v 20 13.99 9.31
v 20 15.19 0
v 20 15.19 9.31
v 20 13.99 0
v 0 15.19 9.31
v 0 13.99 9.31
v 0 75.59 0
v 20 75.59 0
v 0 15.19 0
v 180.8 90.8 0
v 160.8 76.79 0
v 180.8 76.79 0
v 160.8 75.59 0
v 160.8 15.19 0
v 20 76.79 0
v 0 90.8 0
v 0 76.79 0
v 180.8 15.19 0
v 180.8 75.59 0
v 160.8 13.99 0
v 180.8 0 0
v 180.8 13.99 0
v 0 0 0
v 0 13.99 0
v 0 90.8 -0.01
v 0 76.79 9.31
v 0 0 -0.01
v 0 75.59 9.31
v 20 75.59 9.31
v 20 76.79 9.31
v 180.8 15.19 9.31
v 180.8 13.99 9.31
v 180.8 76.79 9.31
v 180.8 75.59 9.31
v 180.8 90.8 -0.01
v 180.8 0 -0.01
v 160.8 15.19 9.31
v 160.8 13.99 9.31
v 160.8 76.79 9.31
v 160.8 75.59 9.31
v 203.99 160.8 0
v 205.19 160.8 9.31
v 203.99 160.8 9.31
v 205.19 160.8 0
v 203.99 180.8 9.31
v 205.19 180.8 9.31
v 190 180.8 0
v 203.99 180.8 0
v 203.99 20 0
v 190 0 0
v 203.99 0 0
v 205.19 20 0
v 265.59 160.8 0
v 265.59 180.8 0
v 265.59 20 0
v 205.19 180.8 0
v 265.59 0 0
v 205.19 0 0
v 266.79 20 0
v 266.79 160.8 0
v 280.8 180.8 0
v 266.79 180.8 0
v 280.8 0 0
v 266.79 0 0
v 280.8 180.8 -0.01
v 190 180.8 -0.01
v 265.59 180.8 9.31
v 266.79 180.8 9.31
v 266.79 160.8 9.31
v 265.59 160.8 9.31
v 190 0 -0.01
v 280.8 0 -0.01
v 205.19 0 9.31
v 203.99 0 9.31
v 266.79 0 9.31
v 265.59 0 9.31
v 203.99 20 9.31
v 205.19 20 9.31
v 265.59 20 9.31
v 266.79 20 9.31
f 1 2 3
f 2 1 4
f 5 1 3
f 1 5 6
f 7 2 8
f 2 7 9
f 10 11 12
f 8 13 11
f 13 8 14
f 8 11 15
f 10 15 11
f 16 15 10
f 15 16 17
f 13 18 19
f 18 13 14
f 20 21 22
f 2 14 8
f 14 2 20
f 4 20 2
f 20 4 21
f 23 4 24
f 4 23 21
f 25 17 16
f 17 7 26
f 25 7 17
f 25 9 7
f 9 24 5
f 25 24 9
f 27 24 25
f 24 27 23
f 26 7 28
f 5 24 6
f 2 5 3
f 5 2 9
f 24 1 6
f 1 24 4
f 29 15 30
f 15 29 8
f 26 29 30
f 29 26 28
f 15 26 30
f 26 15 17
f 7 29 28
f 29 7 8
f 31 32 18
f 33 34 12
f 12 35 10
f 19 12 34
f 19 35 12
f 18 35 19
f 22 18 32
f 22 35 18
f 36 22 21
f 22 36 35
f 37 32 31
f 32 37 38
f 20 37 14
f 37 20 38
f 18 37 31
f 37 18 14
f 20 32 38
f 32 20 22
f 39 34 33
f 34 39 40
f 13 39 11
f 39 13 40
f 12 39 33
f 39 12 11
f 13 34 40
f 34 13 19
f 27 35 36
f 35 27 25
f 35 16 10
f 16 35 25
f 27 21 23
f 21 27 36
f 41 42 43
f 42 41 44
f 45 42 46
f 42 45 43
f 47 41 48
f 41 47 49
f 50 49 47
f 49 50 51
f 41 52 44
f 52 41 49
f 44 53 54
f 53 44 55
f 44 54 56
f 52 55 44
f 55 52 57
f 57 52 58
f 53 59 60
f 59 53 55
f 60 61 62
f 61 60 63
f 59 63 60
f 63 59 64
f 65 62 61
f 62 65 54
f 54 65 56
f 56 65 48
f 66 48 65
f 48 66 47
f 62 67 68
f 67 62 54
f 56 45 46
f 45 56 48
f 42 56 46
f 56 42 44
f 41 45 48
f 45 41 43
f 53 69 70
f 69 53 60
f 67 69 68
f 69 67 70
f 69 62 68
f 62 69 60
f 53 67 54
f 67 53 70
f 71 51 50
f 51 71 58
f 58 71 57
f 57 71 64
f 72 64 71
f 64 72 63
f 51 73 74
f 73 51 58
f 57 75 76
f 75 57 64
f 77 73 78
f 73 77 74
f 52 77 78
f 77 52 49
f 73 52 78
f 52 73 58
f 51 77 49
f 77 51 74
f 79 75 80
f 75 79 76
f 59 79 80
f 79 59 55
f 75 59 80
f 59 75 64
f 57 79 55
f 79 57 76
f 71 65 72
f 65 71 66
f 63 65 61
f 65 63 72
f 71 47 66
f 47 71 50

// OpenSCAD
// file: ../../Base/Boxes.scad
// Fischertechnik Box Foundation
// Pre-designed Boxes

use <Constants.scad>

include <PlacementOptions.scad>

box190Width = 190;
box190Depth = 130;
box130Width = 130;
box130Depth = 95;
boxUsageHeight = 33.9;
boxWallThickness = 2.4;
boxBaseThickness = 1.0;

// getBoxWallThickness()
// Gets the wall thickness of a Fischertechnik Box

function getBoxWallThickness() = boxWallThickness;

// Gets the usable height of a fischertechnik box
function getBoxUsageHeight() = boxUsageHeight;

// Gets the thickness of the Fischertechnik box base.
function getBoxBaseThickness() = boxBaseThickness;

// Gets the usable inner space of a Box 190 as an x/y-list
function getBox190Space() = [
    box190Width - 2*getBoxWallThickness(), 
    box190Depth - 2*getBoxWallThickness() ];

// Imports the Fischertechnik empty box 130x190 mm and places it at position 0,0
// 190x130 are the outer sizes, the inner space is slightly smaller. Use getBox190Space() to get the inner sizes.
// This module needs the STL file "Fischertechnik Box 130x190.stl" in the library path.
// The box is positioned that the usable inner space is at the 0,0,0 position. The

module Box190() {
    translate([-getBoxWallThickness(),-getBoxWallThickness(),-getBoxBaseThickness()])
        import("Fischertechnik Box 130x190.stl", convexity=3);
}

// Gets the usable inner space of a Box 130 as an x/y-list
function getBox130Space() = [
    box130Width - 2*getBoxWallThickness(), 
    box130Depth - 2*getBoxWallThickness() ];

// Imports the Fischertechnik empty box 95x130 mm and places it at position 0,0
// 190x130 are the outer sizes, the inner space is slightly smaller. Use getBox190Space() to get the inner sizes.
// This module needs the STL file "Fischertechnik Box 95x130.stl" in the library path.
// The box is positioned that the usable inner space is at the 0,0,0 position. The

module Box130() {
    translate([-getBoxWallThickness(),-getBoxWallThickness(),-getBoxBaseThickness()])
        import("Fischertechnik Box 95x130.stl", convexity=3);
}

// Creates a web at the specified box walls
// corner 0 = LowerLeft, 1 = UpperLeft, 2 = UpperRight, 3 = LowerRight
// side 0 = LeftOfCorner, 1 = RightOfCorner
// distance = Distance in mm from the corner
// box = inner width and depth of the box (default: Box 190)
// webWidth = length of the web (default is 3 mms)
// webThickness = thickness of the web (default is 1 mm)

module BoxWeb(corner, side, distance, box=getBox190Space(), webWidth=3, webThickness=1.0) {
    sink = getBoxWallThickness()/2;

    width = (corner % 2 == 0) ? 
            (side == LeftOfCorner ? webWidth : webThickness) :
            (side == LeftOfCorner ? webThickness : webWidth);

    depth = (corner % 2 == 0) ? 
            (side == RightOfCorner ? webWidth : webThickness) :
            (side == RightOfCorner ? webThickness : webWidth);
    
    xDiff = corner == LowerLeft ? 
                (side == LeftOfCorner ? -sink : distance) :
            (corner == UpperLeft ?                
                (side == LeftOfCorner ? distance : -sink) :
            (corner == UpperRight ?
                (side == LeftOfCorner ? box.x-webWidth+sink : box.x-distance-webThickness) :
                (side == LeftOfCorner ? box.x-distance-webThickness: box.x-webWidth+sink)));

    yDiff = corner == LowerLeft ? 
                (side == RightOfCorner ? -sink : distance) :
            (corner == UpperLeft ?
                (side == RightOfCorner ? box.y-distance : box.y-webWidth+sink) :
            (corner == UpperRight ?
                (side == RightOfCorner ? box.y-webWidth+sink : box.y-distance) :
                (side == RightOfCorner ? distance : -sink)));
    
    translate([xDiff, yDiff, -getExcess()])
        cube([width, depth, boxUsageHeight + 2*getExcess()]);
}
// file: ../../Base/Rotation.scad
// Fischertechnik Box Foundation
// Geometry Helpers Rotation

include <PlacementOptions.scad>

// getRotatedSpace(space, rotation=NoRotation)
// Rotates the space dependent on the specified rotation

function getRotatedSpace(space, rotation=NoRotation) = [
    (rotation == Rotate90 || rotation == Rotate270) ? space.y : space.x,
    (rotation == Rotate90 || rotation == Rotate270) ? space.x : space.y
];

// Rotates the given space around the fixed left lower corner
// space = the space the children needs as width/depth list [width,depth]
// rotation = 0 Rotate0 degrees, 1 Rotate90 degrees, 2 Rotate180 degrees, 3 Rotate270 degrees (equivalent to -90)

module RotateFix(space, rotation=Rotate0) {
    dy = (rotation == Rotate0 || rotation == Rotate270) ? 0 :
        (rotation == Rotate90) ? space.x :
        space.y;
    dx = (rotation < Rotate180) ? 0 :
        (rotation == Rotate180) ? space.x :
        space.y;
    
    translate([dx, dy, 0])
        rotate([0, 0, rotations[rotation]])
            children();
}
// file: ../../Base/Alignment.scad
// Fischertechnik Box Foundation
// Geometry Helpers Alignment

include <PlacementOptions.scad>

// getAlignedX(elementWidth, spaceWidth, align=AlignRight, offset=0)
// Gets the aligned X offset of an element with the given
// width in the given space.
// elementWidth = The width of the element to positon
// spaceWidth = The space where the element should be aligned
// align = 0 AlignLeft, 1 AlignCenter, 2 AlignRight
// offset = an optional offset from the aligned position. When
// aligned left or centered, then positive values are in X direction.
// When aligned right then positive values are in negative X direction.

function getAlignedX(elementWidth, spaceWidth, align=AlignRight, offset=0) =
    (align == AlignLeft) ?
        offset :
        ((align == AlignCenter) ?
        (spaceWidth - elementWidth)/2 + offset :
        spaceWidth - offset - elementWidth);

// getAlignedY(elementDepth, spaceDepth, align=AlignTop, offset=0)
// Gets the aligned Y offset of an element with the given
// depth in the given space.
// elementDepth = The depth of the element to positon
// spaceDepth = The space where the element should be aligned
// align = 0 AlignBottom, 1 AlignCenter, 2 AlignTop
// offset = an optional offset from the aligned position. When
// aligned bottom or centered, then positive values are in Y direction.
// When aligned top then positive values are in negative Y direction.

function getAlignedY(elementDepth, spaceDepth, align=AlignTop, offset=0) =
    (align == AlignBottom) ?
        offset :
        ((align == AlignCenter) ?
        (spaceDepth - elementDepth)/2 + offset :
        spaceDepth - offset - elementDepth);
// file: ../../Base/Constants.scad
// Fischertechnik Box Foundation
// Constants

// Constant values necessary for multiple elements

// Base constants
dividerThickness = 1.2;
excess = 0.01;
fragments = 90;
tolerance = 0.8;

// Gets the thickness of a divider 
function getDividerThickness() = dividerThickness;

// Gets the excess that is used to merge walls into each other
function getExcess() = excess;

// Gets amount of fragments of a cylinder
function getFragments() = fragments;

// Gets the inner tolerance of a frame to each side
function getTolerance() = tolerance;


// Fischertechnik specific constants
axisDiameter = 4;
axisBottomDiameter = axisDiameter + 1;
standardEdgeDistance = 2.5;
standardWebDistance = 11.5;
standardCornerLength = 15;
tubeWallFactor = 1.6;

// Gets axis diameter
function getAxisDiameter() = axisDiameter;

// Gets axis bottom diameter for thicker part at the bottom
function getAxisBottomDiameter() = axisBottomDiameter;

// gets the standard distance to the wall of the box for dockable frames with webs
function getStandardEdgeDistance() = standardEdgeDistance;

// gets the standard distance of each web to the corner of the dockable frame
function getStandardWebDistance() = standardWebDistance;

// gets the standard length of the corner walls of a dockable frame
function getStandardCornerLength() = standardCornerLength;

// gets the wall thickness of a tube.
function getTubeWallThickness() = tubeWallFactor * getDividerThickness();
// file: ../../Base/PlacementOptions.scad
// Fischertechnik Box Foundation
// Placement Options

// Alignment
NoAlign = 0;
AlignLeft = 1;
AlignBottom = 2;
AlignCenter = 3;
AlignRight = 4;
AlignTop = 5;

// Element rotation degree steps
rotations = [0, -90, -180, -270];

// Rotation
NoRotation = 0;
Rotate0 = 0;
Rotate90 = 1;
Rotate180 = 2;
Rotate270 = 3;

// Docking (seen from above)
NoDock = -1;
DockLeft = 0;
DockTop = 1;
DockRight = 2;
DockCorner = 2;
DockBottom = 3;

// Web corners
LowerLeft = 0;
UpperLeft = 1;
UpperRight = 2;
LowerRight = 3;

// Web position relative to corner
LeftOfCorner = 0;
RightOfCorner = 1;
// file: ../../Elements/RailsBasePlate180x90.scad
// Fischertechnik Box Library
// Base Plate 180 x 90
// 31001

use <../ModelBase/Complex.scad>

width = 180;
depth = 90;

// getRailsBasePlate180x90Space()
// Gets the width and depth of the spave the raols base for the base plate 180x90 needs.
function getRailsBasePlate180x90Space() = getRailsBasePlateVolume(width, depth);

// RailsBasePlate180x90()
// Rails for a base plate of 180 x 90 mm
// 31001

module RailsBasePlate180x90() {
    RailsBasePlate(width, depth);
}

// Test
color("lightgray")
RailsBasePlate180x90();
// file: ../../Base/Placement.scad
// Fischertechnik Box Foundation
// Geometry Helpers Placement

use <Constants.scad>
use <Alignment.scad>
use <Rotation.scad>
use <Boxes.scad>

include <PlacementOptions.scad>

// Place(x=0, y=0, elementSpace=[0,0], alignX=AlignLeft, alignY=AlignBottom, rotation=Rotate0, boxSpace=getBox190Space())
// Places the child at the specified position
// y = Y-Position. This is a relative position when an X aligment is specified.
// x = X-Position. This is a relative position when an Y aligment is specified.
// elementSpace = space of the element to be placed [x,y]
// alignX = -1=NoAlign, 0 AlignLeft, 1 AlignCenter, 3 AlignRight (elementSpace and boxSpace required!)
// alignY = -1=NoAlign, 2 AlignBottom, 1 AlignCenter, 4 AlignTop (elementSpace and boxSpace required!)
// rotation = 0 Rotate0 0 degrees, 1 Rotate90 90 degrees, 
// 2 Rotate180 180 degrees, 3 Rotate270 270 degrees (equivalent to -90)
// boxSpace = Inner space of the box where the placement occurs [x,y] - default is Box 190x130 inner space

module Place(x=0, y=0, elementSpace=[0,0], 
  alignX=AlignLeft, alignY=AlignBottom, 
  rotation=NoRotation, boxSpace=getBox190Space()) {

    module Position(x, y, space, rotation=Rotate0) {
        translate([x, y, 0])
            RotateFix(space, rotation)
                children(0);
    }

    space = getRotatedSpace(elementSpace, rotation);
    alignedX = getAlignedX(space.x, boxSpace.x, alignX, x);
    alignedY = getAlignedY(space.y, boxSpace.y, alignY, y);
    Position(alignedX, alignedY, elementSpace, rotation)
        children(0);
}

// Center(space=getBox130Space(), elementSpace=[0,0])
// space = Space where the children is centered. For cylinder use centered=true and no elementSpace.
// elementSpace = space of the element to be centered [x,y]

module Center(space=getBox190Space(), elementSpace=[0,0]) {
    translate([(space.x - elementSpace.x) / 2, (space.y - elementSpace.y) / 2])
        children(0);
}

// CenterHorizontal(width=0, y=0, offset=0, space=getBox130Space())
// space = Space where the children is centered. For cylinder use centered=true and no elementSpace.
// elementSpace = space of the element to be centered [x,y]

module CenterHorizontal(width=0, y=0, offset=0, space=getBox190Space()) {
    translate([(space.x - width) / 2 + offset, y])
        children(0);
}

// CenterVertical(depth=0, x=0, offset=0, space=getBox130Space())
// space = Space where the children is centered. For cylinder use centered=true and no elementSpace.
// elementSpace = space of the element to be centered [x,y]

module CenterVerticalal(depth=0, x=0, offset=0, space=getBox190Space()) {
    translate([x, (space.y - depth) / 2 + offset])
        children(0);
}
// main file
// Fischertechnik Box Foundation
// Elements
// Test RailsBasePlate180x90

use <../../Base/Placement.scad>
use <../../Elements/RailsBasePlate180x90.scad>

include <../../Base/PlacementOptions.scad>

RailsBasePlate180x90();

Place(190, 0, elementSpace=getRailsBasePlate180x90Space(), rotation=Rotate90)
    RailsBasePlate180x90();
